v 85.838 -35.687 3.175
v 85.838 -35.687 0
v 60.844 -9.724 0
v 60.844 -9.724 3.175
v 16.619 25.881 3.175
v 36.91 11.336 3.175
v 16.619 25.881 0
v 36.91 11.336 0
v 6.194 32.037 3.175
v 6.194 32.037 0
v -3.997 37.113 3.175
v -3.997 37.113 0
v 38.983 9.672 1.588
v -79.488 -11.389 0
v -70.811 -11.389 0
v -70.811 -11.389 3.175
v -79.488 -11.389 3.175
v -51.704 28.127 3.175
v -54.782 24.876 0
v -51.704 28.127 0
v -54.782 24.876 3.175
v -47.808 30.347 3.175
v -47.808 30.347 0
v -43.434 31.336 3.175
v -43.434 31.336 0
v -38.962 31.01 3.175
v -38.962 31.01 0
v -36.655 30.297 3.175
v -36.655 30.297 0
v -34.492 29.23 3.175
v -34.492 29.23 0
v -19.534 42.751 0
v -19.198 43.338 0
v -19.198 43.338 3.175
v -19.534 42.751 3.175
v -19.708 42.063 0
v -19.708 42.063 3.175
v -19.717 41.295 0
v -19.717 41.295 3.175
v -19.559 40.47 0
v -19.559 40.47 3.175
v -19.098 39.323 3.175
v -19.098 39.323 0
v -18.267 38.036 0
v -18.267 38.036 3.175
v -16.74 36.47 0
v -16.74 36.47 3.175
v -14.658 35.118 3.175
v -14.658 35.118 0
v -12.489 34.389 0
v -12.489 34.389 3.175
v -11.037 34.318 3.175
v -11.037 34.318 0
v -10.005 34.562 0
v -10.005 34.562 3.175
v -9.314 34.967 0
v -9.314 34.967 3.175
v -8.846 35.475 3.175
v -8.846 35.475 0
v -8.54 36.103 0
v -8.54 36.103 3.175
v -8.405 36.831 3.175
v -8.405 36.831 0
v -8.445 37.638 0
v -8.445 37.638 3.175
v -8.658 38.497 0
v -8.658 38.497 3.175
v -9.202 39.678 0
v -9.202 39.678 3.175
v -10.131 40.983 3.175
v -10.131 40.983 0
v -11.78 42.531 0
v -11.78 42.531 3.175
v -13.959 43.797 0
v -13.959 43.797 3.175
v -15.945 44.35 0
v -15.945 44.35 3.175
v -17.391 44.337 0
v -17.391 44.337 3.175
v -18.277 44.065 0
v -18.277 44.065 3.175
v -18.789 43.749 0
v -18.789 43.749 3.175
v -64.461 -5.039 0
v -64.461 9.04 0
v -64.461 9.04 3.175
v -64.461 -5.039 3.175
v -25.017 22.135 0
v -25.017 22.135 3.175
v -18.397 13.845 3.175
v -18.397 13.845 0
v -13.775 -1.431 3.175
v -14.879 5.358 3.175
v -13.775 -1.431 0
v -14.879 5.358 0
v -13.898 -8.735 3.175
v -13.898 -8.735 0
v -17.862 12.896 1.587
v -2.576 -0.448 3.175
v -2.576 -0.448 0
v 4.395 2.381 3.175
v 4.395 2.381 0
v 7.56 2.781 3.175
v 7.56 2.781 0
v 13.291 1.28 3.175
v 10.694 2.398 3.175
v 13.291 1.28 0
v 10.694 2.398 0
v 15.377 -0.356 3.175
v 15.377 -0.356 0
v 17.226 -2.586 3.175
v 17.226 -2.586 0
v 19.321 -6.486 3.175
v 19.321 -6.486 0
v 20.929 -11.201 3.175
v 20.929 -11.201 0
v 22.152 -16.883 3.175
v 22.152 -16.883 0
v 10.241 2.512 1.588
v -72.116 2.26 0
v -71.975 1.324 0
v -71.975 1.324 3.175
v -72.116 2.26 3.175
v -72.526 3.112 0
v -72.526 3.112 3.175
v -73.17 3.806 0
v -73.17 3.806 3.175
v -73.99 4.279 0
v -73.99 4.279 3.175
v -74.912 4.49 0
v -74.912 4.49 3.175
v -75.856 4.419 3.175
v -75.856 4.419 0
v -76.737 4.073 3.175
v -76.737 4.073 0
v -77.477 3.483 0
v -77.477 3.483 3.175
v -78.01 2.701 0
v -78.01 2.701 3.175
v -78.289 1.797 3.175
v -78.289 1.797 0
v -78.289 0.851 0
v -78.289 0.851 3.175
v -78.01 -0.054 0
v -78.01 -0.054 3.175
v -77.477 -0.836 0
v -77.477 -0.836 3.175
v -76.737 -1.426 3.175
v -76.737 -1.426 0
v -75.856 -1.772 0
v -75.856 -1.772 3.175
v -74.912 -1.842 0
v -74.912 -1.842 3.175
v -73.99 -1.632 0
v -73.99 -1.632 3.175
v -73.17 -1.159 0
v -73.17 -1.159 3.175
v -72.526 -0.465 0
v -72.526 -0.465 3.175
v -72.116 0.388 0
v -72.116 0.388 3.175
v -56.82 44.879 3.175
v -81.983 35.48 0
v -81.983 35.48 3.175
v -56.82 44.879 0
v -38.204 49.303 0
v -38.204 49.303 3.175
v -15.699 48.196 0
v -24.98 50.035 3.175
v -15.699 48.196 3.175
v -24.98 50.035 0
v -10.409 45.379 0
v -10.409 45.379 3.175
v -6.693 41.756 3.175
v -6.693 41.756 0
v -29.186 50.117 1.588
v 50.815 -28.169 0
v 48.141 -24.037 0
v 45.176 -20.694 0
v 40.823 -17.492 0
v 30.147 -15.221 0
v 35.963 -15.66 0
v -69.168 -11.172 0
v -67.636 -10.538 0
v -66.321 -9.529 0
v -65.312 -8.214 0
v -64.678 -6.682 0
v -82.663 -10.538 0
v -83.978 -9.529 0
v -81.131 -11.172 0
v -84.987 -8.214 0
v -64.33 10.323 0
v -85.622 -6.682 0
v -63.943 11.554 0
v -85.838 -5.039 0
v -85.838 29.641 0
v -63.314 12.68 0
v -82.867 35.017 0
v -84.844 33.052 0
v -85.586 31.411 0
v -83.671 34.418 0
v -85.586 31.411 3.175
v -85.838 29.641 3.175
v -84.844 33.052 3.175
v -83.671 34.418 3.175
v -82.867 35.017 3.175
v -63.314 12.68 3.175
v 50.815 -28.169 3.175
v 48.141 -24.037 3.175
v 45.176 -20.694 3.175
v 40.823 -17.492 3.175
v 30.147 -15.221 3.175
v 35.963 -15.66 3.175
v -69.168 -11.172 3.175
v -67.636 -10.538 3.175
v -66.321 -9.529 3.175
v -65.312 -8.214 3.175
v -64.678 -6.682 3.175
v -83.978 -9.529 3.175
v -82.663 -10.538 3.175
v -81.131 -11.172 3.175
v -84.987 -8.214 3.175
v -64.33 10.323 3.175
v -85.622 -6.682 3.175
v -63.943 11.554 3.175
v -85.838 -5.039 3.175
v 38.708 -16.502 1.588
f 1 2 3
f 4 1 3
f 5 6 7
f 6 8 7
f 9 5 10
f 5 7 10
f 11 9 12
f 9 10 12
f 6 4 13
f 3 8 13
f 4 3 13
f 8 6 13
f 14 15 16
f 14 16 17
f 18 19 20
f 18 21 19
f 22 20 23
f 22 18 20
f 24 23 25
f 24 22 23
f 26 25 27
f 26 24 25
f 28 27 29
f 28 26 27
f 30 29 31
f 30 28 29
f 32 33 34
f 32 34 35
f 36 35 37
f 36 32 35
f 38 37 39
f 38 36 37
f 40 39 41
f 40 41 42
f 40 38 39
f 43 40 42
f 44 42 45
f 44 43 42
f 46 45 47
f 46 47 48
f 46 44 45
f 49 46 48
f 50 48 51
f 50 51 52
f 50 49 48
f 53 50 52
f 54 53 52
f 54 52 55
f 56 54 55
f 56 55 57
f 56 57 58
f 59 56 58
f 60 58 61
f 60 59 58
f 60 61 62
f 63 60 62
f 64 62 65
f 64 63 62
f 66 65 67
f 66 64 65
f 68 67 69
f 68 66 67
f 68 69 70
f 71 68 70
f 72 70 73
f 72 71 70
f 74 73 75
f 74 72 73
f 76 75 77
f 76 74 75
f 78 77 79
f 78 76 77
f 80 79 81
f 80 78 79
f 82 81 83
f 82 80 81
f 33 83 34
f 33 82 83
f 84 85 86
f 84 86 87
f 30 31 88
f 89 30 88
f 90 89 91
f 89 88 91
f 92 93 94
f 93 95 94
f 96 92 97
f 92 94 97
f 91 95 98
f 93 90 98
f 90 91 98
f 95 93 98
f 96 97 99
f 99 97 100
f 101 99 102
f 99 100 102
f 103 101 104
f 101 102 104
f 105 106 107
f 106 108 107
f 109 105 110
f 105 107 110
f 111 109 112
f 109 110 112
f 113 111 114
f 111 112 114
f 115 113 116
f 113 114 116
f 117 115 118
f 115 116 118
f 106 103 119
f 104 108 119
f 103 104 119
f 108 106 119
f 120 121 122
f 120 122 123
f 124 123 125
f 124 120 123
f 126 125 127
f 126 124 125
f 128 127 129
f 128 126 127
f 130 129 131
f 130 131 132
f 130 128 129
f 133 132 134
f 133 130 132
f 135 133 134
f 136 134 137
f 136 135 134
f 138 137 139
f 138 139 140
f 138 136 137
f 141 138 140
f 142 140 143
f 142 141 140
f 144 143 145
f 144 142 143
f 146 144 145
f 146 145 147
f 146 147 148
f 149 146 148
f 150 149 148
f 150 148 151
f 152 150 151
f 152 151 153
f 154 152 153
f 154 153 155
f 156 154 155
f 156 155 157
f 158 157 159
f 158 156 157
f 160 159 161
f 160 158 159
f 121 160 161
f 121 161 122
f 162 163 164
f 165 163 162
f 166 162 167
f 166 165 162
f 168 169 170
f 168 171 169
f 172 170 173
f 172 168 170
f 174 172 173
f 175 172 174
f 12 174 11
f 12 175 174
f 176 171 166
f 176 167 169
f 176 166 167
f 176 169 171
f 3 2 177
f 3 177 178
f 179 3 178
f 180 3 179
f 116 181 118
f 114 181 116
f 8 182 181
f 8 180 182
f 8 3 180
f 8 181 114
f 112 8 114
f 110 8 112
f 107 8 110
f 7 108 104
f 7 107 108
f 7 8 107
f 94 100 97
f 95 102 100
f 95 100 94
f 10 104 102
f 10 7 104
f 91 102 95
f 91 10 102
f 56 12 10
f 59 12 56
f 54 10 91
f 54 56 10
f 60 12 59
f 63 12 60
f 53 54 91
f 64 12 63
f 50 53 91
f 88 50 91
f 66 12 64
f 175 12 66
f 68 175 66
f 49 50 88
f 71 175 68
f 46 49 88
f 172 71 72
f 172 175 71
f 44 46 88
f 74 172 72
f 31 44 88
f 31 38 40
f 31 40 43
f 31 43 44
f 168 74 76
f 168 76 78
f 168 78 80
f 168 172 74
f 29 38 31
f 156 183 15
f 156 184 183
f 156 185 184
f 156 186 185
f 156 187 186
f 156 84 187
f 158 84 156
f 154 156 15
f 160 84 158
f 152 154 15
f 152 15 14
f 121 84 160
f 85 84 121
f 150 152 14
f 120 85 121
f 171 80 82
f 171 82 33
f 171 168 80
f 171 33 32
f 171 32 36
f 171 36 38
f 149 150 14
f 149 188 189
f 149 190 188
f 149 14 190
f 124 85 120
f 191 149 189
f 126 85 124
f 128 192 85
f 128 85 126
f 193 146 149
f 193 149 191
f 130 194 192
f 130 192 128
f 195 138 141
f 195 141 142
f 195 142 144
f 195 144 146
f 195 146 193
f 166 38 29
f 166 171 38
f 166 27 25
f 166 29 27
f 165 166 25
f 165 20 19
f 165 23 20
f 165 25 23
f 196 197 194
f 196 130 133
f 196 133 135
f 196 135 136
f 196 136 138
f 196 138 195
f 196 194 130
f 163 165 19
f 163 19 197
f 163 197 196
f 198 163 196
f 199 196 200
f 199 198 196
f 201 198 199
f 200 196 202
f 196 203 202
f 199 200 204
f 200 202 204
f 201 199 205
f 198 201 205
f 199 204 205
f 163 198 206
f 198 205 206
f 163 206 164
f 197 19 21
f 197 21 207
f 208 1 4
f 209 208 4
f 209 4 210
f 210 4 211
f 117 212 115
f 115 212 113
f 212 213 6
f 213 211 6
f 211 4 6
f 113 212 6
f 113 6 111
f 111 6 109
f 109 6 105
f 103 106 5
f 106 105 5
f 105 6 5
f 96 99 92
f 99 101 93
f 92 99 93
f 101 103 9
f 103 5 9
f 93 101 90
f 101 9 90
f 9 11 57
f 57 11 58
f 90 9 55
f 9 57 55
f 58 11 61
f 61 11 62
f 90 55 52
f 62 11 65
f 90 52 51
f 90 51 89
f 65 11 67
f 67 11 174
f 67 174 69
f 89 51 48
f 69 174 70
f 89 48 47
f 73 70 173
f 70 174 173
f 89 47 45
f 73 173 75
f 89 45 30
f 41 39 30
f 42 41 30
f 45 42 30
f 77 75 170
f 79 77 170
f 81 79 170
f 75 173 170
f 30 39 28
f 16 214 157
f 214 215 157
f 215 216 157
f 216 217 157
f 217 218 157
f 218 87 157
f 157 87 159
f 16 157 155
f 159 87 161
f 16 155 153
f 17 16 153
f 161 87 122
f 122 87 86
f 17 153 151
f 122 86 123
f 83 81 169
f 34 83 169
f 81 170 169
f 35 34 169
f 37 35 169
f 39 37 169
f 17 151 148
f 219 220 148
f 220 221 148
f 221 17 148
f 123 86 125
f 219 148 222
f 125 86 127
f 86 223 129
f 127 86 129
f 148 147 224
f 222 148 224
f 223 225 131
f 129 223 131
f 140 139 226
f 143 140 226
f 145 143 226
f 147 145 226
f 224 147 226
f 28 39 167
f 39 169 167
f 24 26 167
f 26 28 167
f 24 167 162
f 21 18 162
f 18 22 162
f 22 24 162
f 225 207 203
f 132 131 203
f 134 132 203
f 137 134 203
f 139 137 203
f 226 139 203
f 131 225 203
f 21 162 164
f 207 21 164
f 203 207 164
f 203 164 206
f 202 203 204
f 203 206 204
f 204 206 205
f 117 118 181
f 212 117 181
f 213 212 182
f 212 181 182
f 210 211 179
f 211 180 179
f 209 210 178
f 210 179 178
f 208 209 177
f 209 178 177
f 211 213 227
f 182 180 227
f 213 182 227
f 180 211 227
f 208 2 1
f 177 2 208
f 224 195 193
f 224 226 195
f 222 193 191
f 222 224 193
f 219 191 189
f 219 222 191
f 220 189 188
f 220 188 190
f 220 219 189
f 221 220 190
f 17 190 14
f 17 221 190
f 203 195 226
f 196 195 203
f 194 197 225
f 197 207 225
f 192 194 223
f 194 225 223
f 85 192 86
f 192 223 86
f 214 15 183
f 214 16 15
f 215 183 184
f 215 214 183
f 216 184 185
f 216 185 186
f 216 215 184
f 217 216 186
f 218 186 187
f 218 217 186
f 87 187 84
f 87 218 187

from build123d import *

# Parameters (mm, degrees)
SKETCH1_R           = 3.175
SKETCH1_RX          = 6.501731069
SKETCH1_RY          = 3.917709747
BOSS_EXTRUDE1_DEPTH = 3.175
FILLET1_R           = 6.35
FILLET2_R           = 15.24
FILLET3_R           = 6.35


with BuildPart() as part:
    # Sketch1 → Boss-Extrude1 (new body)
    with BuildSketch(Plane.XY):
        with BuildLine():
            Line((85.837990546, -35.686780557), (50.815428811, -28.169433219))
            add(Edge.make_bspline(
                [(22.151507794, -16.88306006), (40.93348508, -10.477937426), (50.815428811, -28.169433219)],
                knots=[0, 0, 0, 1, 1, 1], degree=2))
            add(Edge.make_bspline(
                [(-13.89812039, -8.73455109), (16.354395889, 17.832088288), (22.151507794, -16.88306006)],
                knots=[0, 0, 0, 1, 1, 1], degree=2))
            add(Edge.make_bspline(
                [(-47.440785313, 35.367440163), (-10.94231892, 21.565916132), (-13.89812039, -8.73455109)],
                knots=[0, 0, 0, 1, 1, 1], degree=2))
            Line((-47.440785313, 35.367440163), (-64.461456133, 11.041010118))
            Line((-64.461456133, 11.041010118), (-64.461456133, -11.388692522))
            Line((-64.461456133, -11.388692522), (-85.837990546, -11.388692522))
            Line((-85.837990546, -11.388692522), (-85.837990546, 33.806971222))
            add(Edge.make_bspline(
                [(-85.837990546, 33.806971222), (-15.708828484, 64.705105309), (-3.996524698, 37.11343766)],
                knots=[0, 0, 0, 0.406769717, 0.406769717, 0.406769717], degree=2))
            add(Edge.make_bspline(
                [(85.837990546, -35.686780557), (37.045439563, 18.631346841), (-3.996524698, 37.11343766)],
                knots=[0, 0, 0, 0.371923551, 0.371923551, 0.371923551], degree=2))
        make_face()
        with Locations((-75.14972334, 1.323731685)):
            Circle(SKETCH1_R, mode=Mode.SUBTRACT)
        with Locations(Location((-14.065908589, 39.346528079), (0, 0, 142.125016349))):
            Ellipse(SKETCH1_RX, SKETCH1_RY, mode=Mode.SUBTRACT)
    extrude(amount=BOSS_EXTRUDE1_DEPTH)

    # Fillet1
    fillet1_edges = [part.edges().sort_by_distance(p)[0] for p in [
        (-64.461456133, 11.041010118, 1.5875),
        (-64.461456133, -11.388692522, 1.5875),
        (-85.837990546, -11.388692522, 1.5875),
    ]]
    fillet(fillet1_edges, radius=FILLET1_R)

    # Fillet2
    fillet2_edges = [part.edges().sort_by_distance(p)[0] for p in [
        (-47.440785313, 35.367440163, 1.5875),
    ]]
    fillet(fillet2_edges, radius=FILLET2_R)

    # Fillet3
    fillet3_edges = [part.edges().sort_by_distance(p)[0] for p in [
        (-85.837990546, 33.806971222, 1.5875),
    ]]
    fillet(fillet3_edges, radius=FILLET3_R)


solid = part.part
